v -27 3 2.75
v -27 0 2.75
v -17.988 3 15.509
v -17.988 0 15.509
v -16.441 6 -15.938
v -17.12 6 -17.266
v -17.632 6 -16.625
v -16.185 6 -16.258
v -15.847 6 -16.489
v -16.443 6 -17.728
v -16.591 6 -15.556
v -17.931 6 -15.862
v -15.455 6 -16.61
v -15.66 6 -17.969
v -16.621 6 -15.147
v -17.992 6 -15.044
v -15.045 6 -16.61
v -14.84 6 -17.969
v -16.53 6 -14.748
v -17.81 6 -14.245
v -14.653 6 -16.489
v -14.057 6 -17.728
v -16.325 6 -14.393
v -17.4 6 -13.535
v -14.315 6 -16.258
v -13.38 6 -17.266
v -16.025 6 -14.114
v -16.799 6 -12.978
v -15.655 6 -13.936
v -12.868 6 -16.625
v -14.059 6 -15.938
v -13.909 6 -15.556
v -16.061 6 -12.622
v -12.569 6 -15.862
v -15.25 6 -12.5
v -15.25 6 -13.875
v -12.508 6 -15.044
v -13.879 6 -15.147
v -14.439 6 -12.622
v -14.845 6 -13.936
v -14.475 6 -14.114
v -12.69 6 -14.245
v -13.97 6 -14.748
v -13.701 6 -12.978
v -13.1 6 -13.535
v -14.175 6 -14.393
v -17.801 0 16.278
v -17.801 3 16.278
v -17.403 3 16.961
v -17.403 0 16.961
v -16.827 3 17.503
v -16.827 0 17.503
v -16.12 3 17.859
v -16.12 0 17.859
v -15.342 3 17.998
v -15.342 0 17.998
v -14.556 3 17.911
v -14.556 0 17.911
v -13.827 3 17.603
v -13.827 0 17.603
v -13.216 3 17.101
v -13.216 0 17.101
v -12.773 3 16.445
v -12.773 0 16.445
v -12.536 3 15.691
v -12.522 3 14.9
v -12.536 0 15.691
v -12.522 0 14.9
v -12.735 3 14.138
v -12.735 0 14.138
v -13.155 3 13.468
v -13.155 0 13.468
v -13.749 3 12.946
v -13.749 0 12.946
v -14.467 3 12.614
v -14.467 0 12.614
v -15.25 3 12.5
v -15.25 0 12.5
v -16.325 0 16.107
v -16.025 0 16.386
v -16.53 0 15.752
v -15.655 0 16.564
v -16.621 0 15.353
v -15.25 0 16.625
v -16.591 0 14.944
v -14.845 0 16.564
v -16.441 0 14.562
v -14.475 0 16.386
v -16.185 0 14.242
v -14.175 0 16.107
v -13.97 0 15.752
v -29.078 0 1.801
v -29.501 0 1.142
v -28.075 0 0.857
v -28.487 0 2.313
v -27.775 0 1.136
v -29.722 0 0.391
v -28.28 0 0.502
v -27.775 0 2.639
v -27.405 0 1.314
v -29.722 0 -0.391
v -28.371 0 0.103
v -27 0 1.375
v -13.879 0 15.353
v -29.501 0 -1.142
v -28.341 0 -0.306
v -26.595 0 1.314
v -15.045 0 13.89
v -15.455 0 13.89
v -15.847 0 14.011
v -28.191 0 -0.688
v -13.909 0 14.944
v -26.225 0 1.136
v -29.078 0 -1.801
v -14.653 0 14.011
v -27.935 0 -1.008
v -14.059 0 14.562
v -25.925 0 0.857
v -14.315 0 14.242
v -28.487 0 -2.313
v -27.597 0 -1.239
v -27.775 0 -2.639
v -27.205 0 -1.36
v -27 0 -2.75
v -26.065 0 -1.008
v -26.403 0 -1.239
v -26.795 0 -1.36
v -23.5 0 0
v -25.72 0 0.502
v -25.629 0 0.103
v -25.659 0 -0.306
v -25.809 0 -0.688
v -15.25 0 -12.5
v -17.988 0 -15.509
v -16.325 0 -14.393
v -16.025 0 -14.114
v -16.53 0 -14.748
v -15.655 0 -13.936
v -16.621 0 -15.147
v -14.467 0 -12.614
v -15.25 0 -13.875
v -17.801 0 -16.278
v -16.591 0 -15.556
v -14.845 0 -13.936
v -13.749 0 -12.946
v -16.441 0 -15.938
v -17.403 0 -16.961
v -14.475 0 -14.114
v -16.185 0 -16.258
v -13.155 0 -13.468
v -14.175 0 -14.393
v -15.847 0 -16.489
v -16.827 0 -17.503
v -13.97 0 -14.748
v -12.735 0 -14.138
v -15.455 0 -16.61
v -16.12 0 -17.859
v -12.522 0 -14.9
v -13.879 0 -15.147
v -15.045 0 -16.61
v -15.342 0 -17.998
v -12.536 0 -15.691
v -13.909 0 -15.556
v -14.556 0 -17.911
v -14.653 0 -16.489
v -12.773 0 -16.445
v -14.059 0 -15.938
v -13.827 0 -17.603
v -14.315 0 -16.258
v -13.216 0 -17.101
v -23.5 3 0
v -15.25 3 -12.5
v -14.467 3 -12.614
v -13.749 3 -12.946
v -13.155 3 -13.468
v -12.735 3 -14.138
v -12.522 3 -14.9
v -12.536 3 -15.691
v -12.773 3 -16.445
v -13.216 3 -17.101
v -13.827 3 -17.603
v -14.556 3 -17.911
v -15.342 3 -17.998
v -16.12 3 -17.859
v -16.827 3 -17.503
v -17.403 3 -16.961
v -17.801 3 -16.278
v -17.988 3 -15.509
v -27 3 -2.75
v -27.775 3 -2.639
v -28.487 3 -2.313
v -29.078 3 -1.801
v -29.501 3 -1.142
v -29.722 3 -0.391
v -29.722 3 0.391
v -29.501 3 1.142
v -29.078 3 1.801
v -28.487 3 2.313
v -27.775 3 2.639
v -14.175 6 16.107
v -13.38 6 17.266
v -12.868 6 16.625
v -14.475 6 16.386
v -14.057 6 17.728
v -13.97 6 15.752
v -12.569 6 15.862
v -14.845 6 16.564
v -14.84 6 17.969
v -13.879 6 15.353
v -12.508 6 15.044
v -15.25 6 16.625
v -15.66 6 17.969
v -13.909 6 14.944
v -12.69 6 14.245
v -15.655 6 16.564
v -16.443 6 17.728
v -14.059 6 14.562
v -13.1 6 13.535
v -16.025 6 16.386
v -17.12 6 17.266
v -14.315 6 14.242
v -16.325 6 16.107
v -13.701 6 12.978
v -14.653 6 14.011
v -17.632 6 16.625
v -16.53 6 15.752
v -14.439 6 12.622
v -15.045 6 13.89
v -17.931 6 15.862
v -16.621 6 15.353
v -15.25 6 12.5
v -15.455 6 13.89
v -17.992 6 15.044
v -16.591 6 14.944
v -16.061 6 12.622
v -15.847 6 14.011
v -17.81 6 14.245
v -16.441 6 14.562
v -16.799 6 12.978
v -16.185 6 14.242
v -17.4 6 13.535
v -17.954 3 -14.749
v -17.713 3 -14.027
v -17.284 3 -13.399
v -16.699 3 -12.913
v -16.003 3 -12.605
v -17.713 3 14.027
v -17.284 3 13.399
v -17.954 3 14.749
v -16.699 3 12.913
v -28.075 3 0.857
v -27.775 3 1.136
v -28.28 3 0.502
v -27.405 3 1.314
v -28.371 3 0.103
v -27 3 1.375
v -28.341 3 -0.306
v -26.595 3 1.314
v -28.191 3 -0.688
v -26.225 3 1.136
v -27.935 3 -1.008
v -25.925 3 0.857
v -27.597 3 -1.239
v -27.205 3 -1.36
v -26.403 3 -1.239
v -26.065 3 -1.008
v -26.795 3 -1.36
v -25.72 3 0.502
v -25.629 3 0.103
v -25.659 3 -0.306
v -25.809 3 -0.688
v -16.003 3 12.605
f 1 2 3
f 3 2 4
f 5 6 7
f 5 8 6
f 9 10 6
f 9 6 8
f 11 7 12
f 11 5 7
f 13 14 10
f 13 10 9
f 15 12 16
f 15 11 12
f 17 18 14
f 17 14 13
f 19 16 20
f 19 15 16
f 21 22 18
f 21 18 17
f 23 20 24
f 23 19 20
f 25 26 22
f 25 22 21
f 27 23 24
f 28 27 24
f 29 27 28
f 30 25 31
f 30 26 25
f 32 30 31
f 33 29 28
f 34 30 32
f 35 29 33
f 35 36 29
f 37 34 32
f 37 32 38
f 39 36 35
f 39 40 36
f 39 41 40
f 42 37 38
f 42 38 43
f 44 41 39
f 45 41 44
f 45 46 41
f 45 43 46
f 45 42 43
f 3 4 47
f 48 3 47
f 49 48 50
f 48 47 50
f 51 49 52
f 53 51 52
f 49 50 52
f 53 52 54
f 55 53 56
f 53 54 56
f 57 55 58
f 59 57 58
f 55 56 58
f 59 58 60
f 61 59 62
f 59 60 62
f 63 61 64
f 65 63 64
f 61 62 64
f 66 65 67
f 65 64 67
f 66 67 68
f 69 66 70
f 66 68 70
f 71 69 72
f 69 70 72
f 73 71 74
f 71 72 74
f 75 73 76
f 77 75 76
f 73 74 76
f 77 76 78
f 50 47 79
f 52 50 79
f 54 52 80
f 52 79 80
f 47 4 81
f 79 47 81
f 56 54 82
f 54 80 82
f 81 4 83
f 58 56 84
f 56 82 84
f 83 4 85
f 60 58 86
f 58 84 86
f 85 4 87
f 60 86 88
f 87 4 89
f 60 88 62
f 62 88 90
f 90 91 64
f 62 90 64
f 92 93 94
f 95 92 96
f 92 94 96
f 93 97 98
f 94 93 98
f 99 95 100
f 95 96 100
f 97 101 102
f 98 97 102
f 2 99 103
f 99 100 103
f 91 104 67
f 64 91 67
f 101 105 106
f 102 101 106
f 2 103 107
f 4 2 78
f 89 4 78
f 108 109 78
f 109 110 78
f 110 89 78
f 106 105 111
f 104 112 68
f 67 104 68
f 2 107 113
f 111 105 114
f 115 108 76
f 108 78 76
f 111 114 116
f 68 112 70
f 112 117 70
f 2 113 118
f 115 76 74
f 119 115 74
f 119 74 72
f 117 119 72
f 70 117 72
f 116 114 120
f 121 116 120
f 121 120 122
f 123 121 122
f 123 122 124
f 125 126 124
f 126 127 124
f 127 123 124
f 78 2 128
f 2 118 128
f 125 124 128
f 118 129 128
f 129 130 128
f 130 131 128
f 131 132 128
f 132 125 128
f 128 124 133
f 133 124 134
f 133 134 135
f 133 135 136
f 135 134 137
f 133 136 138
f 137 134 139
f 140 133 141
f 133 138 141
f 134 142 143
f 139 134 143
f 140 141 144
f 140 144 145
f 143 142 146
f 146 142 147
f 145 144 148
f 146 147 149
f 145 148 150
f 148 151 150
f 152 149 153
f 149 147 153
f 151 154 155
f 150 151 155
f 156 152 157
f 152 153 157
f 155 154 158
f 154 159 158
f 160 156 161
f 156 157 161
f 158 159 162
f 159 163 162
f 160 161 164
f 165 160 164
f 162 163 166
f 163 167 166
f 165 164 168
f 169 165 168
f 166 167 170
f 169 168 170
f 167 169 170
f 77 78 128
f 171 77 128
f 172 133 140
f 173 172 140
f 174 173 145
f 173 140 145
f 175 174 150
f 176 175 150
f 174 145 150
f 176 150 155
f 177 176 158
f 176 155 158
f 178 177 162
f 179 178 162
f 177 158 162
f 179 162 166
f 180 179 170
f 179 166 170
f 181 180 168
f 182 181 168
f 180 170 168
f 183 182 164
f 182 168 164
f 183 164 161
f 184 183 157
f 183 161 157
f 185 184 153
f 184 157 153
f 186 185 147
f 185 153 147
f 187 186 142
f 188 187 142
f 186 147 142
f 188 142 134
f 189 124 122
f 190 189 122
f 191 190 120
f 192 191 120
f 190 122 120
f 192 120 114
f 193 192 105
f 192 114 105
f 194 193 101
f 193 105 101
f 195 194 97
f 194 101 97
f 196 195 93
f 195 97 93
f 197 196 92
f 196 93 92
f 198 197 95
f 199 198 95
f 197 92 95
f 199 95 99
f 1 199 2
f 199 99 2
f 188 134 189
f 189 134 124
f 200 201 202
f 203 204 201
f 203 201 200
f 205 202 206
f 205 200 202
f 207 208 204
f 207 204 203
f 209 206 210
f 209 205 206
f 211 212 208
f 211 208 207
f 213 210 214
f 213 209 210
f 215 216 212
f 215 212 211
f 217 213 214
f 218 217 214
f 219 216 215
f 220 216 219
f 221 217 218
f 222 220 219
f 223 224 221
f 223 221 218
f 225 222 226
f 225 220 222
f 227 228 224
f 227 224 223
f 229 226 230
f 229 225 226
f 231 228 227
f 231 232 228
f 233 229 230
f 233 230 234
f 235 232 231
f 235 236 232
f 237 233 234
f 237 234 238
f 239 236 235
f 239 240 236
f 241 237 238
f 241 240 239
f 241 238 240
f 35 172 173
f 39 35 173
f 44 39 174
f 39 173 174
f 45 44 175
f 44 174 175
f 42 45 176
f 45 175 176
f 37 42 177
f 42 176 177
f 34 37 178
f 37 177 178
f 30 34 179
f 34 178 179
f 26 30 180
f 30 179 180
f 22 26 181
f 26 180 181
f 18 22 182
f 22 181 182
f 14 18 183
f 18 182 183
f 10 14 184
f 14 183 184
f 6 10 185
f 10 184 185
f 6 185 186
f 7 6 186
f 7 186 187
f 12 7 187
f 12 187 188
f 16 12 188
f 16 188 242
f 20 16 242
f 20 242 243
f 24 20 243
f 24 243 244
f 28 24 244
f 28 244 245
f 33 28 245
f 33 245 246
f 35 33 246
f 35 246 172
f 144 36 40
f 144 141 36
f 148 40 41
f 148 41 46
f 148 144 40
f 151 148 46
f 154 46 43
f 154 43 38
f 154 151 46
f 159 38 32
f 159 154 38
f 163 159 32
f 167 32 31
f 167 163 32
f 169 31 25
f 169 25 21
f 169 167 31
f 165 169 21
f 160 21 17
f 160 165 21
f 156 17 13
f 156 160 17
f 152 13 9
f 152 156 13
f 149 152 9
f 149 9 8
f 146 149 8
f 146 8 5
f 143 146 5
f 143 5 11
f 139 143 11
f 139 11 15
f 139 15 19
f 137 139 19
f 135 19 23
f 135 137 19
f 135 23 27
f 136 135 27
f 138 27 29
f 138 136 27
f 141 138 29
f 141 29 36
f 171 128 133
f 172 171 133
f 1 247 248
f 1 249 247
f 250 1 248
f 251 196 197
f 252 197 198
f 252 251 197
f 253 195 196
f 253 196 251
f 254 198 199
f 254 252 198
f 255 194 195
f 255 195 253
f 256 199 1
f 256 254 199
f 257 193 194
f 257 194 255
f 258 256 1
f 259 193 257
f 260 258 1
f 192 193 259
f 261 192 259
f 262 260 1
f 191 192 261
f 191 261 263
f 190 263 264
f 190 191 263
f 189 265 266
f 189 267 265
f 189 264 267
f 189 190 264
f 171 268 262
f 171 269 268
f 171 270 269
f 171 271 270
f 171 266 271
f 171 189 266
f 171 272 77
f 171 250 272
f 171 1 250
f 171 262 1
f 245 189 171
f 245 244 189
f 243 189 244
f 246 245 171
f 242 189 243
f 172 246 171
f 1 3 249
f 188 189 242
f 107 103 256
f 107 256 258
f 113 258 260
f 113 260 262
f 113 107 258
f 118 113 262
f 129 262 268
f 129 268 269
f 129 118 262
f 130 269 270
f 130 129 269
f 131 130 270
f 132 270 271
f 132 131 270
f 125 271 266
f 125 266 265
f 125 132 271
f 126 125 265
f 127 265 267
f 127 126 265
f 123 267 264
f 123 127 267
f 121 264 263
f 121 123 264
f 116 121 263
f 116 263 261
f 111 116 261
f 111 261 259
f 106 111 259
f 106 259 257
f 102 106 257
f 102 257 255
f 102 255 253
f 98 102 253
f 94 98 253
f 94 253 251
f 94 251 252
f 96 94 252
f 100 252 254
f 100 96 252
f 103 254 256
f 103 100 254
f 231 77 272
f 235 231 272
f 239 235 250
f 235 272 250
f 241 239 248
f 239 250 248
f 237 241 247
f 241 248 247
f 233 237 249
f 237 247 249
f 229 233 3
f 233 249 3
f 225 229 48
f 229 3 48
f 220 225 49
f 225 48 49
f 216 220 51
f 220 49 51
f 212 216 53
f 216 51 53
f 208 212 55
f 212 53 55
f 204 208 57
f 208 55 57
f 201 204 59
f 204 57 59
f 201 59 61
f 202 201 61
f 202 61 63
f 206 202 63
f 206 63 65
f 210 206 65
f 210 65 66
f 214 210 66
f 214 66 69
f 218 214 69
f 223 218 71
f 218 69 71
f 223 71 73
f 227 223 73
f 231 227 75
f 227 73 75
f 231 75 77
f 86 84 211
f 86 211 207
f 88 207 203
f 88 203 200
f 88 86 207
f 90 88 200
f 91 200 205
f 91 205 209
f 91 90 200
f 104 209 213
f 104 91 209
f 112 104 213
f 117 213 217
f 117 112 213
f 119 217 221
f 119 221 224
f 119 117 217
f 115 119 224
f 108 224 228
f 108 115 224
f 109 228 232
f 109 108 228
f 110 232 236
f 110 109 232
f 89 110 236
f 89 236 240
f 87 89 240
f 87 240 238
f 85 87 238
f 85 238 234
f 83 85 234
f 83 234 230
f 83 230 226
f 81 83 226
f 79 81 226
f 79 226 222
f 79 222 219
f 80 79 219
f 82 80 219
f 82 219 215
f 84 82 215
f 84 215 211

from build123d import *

# Parameters (mm, degrees)
SKETCH2_R           = 1.375
BOSS_EXTRUDE1_DEPTH = 3
SKETCH3_R           = 2.75
SKETCH3_R_2         = 1.375
BOSS_EXTRUDE2_DEPTH = 3


with BuildPart() as part:
    # Sketch2 → Boss-Extrude1 (new body)
    with BuildSketch(Plane(origin=(0, 0, 0), x_dir=(1, 0, 0), z_dir=(0, 1, 0))):
        with BuildLine():
            Line((-27, -2.75), (-17.987773433, -15.509030166))
            ThreePointArc((-17.987773433, -15.509030166), (-13.21593597, -17.100698117), (-15.25, -12.5))
            Line((-15.25, -12.5), (-23.5, 0))
            Line((-23.5, 0), (-15.25, 12.5))
            ThreePointArc((-15.25, 12.5), (-13.21593597, 17.100698117), (-17.987773433, 15.509030166))
            Line((-17.987773433, 15.509030166), (-27, 2.75))
            ThreePointArc((-27, 2.75), (-29.75, 0), (-27, -2.75))
        make_face()
        with Locations(Location((-27, 0, 0), (0, 0, 270))):
            Circle(SKETCH2_R, mode=Mode.SUBTRACT)
        with Locations(Location((-15.25, 15.25, 0), (0, 0, 270))):
            Circle(SKETCH2_R, mode=Mode.SUBTRACT)
        with Locations(Location((-15.25, -15.25, 0), (0, 0, 270))):
            Circle(SKETCH2_R, mode=Mode.SUBTRACT)
    extrude(amount=BOSS_EXTRUDE1_DEPTH)

    # Sketch3 → Boss-Extrude2 (add)
    # profile 1 of 2: a face of its own
    with BuildSketch(Plane(origin=(0, 3, 0), x_dir=(1, 0, 0), z_dir=(0, 1, 0))):
        with Locations(Location((-15.25, 15.25, 0), (0, 0, 270))):
            Circle(SKETCH3_R)
        with Locations(Location((-15.25, 15.25, 0), (0, 0, 270))):
            Circle(SKETCH3_R_2, mode=Mode.SUBTRACT)
    # profile 2 of 2: a face of its own
    with BuildSketch(Plane(origin=(0, 3, 0), x_dir=(1, 0, 0), z_dir=(0, 1, 0))):
        with Locations(Location((-15.25, -15.25, 0), (0, 0, 90))):
            Circle(SKETCH3_R)
        with Locations(Location((-15.25, -15.25, 0), (0, 0, 270))):
            Circle(SKETCH3_R_2, mode=Mode.SUBTRACT)
    extrude(amount=BOSS_EXTRUDE2_DEPTH)


solid = part.part
